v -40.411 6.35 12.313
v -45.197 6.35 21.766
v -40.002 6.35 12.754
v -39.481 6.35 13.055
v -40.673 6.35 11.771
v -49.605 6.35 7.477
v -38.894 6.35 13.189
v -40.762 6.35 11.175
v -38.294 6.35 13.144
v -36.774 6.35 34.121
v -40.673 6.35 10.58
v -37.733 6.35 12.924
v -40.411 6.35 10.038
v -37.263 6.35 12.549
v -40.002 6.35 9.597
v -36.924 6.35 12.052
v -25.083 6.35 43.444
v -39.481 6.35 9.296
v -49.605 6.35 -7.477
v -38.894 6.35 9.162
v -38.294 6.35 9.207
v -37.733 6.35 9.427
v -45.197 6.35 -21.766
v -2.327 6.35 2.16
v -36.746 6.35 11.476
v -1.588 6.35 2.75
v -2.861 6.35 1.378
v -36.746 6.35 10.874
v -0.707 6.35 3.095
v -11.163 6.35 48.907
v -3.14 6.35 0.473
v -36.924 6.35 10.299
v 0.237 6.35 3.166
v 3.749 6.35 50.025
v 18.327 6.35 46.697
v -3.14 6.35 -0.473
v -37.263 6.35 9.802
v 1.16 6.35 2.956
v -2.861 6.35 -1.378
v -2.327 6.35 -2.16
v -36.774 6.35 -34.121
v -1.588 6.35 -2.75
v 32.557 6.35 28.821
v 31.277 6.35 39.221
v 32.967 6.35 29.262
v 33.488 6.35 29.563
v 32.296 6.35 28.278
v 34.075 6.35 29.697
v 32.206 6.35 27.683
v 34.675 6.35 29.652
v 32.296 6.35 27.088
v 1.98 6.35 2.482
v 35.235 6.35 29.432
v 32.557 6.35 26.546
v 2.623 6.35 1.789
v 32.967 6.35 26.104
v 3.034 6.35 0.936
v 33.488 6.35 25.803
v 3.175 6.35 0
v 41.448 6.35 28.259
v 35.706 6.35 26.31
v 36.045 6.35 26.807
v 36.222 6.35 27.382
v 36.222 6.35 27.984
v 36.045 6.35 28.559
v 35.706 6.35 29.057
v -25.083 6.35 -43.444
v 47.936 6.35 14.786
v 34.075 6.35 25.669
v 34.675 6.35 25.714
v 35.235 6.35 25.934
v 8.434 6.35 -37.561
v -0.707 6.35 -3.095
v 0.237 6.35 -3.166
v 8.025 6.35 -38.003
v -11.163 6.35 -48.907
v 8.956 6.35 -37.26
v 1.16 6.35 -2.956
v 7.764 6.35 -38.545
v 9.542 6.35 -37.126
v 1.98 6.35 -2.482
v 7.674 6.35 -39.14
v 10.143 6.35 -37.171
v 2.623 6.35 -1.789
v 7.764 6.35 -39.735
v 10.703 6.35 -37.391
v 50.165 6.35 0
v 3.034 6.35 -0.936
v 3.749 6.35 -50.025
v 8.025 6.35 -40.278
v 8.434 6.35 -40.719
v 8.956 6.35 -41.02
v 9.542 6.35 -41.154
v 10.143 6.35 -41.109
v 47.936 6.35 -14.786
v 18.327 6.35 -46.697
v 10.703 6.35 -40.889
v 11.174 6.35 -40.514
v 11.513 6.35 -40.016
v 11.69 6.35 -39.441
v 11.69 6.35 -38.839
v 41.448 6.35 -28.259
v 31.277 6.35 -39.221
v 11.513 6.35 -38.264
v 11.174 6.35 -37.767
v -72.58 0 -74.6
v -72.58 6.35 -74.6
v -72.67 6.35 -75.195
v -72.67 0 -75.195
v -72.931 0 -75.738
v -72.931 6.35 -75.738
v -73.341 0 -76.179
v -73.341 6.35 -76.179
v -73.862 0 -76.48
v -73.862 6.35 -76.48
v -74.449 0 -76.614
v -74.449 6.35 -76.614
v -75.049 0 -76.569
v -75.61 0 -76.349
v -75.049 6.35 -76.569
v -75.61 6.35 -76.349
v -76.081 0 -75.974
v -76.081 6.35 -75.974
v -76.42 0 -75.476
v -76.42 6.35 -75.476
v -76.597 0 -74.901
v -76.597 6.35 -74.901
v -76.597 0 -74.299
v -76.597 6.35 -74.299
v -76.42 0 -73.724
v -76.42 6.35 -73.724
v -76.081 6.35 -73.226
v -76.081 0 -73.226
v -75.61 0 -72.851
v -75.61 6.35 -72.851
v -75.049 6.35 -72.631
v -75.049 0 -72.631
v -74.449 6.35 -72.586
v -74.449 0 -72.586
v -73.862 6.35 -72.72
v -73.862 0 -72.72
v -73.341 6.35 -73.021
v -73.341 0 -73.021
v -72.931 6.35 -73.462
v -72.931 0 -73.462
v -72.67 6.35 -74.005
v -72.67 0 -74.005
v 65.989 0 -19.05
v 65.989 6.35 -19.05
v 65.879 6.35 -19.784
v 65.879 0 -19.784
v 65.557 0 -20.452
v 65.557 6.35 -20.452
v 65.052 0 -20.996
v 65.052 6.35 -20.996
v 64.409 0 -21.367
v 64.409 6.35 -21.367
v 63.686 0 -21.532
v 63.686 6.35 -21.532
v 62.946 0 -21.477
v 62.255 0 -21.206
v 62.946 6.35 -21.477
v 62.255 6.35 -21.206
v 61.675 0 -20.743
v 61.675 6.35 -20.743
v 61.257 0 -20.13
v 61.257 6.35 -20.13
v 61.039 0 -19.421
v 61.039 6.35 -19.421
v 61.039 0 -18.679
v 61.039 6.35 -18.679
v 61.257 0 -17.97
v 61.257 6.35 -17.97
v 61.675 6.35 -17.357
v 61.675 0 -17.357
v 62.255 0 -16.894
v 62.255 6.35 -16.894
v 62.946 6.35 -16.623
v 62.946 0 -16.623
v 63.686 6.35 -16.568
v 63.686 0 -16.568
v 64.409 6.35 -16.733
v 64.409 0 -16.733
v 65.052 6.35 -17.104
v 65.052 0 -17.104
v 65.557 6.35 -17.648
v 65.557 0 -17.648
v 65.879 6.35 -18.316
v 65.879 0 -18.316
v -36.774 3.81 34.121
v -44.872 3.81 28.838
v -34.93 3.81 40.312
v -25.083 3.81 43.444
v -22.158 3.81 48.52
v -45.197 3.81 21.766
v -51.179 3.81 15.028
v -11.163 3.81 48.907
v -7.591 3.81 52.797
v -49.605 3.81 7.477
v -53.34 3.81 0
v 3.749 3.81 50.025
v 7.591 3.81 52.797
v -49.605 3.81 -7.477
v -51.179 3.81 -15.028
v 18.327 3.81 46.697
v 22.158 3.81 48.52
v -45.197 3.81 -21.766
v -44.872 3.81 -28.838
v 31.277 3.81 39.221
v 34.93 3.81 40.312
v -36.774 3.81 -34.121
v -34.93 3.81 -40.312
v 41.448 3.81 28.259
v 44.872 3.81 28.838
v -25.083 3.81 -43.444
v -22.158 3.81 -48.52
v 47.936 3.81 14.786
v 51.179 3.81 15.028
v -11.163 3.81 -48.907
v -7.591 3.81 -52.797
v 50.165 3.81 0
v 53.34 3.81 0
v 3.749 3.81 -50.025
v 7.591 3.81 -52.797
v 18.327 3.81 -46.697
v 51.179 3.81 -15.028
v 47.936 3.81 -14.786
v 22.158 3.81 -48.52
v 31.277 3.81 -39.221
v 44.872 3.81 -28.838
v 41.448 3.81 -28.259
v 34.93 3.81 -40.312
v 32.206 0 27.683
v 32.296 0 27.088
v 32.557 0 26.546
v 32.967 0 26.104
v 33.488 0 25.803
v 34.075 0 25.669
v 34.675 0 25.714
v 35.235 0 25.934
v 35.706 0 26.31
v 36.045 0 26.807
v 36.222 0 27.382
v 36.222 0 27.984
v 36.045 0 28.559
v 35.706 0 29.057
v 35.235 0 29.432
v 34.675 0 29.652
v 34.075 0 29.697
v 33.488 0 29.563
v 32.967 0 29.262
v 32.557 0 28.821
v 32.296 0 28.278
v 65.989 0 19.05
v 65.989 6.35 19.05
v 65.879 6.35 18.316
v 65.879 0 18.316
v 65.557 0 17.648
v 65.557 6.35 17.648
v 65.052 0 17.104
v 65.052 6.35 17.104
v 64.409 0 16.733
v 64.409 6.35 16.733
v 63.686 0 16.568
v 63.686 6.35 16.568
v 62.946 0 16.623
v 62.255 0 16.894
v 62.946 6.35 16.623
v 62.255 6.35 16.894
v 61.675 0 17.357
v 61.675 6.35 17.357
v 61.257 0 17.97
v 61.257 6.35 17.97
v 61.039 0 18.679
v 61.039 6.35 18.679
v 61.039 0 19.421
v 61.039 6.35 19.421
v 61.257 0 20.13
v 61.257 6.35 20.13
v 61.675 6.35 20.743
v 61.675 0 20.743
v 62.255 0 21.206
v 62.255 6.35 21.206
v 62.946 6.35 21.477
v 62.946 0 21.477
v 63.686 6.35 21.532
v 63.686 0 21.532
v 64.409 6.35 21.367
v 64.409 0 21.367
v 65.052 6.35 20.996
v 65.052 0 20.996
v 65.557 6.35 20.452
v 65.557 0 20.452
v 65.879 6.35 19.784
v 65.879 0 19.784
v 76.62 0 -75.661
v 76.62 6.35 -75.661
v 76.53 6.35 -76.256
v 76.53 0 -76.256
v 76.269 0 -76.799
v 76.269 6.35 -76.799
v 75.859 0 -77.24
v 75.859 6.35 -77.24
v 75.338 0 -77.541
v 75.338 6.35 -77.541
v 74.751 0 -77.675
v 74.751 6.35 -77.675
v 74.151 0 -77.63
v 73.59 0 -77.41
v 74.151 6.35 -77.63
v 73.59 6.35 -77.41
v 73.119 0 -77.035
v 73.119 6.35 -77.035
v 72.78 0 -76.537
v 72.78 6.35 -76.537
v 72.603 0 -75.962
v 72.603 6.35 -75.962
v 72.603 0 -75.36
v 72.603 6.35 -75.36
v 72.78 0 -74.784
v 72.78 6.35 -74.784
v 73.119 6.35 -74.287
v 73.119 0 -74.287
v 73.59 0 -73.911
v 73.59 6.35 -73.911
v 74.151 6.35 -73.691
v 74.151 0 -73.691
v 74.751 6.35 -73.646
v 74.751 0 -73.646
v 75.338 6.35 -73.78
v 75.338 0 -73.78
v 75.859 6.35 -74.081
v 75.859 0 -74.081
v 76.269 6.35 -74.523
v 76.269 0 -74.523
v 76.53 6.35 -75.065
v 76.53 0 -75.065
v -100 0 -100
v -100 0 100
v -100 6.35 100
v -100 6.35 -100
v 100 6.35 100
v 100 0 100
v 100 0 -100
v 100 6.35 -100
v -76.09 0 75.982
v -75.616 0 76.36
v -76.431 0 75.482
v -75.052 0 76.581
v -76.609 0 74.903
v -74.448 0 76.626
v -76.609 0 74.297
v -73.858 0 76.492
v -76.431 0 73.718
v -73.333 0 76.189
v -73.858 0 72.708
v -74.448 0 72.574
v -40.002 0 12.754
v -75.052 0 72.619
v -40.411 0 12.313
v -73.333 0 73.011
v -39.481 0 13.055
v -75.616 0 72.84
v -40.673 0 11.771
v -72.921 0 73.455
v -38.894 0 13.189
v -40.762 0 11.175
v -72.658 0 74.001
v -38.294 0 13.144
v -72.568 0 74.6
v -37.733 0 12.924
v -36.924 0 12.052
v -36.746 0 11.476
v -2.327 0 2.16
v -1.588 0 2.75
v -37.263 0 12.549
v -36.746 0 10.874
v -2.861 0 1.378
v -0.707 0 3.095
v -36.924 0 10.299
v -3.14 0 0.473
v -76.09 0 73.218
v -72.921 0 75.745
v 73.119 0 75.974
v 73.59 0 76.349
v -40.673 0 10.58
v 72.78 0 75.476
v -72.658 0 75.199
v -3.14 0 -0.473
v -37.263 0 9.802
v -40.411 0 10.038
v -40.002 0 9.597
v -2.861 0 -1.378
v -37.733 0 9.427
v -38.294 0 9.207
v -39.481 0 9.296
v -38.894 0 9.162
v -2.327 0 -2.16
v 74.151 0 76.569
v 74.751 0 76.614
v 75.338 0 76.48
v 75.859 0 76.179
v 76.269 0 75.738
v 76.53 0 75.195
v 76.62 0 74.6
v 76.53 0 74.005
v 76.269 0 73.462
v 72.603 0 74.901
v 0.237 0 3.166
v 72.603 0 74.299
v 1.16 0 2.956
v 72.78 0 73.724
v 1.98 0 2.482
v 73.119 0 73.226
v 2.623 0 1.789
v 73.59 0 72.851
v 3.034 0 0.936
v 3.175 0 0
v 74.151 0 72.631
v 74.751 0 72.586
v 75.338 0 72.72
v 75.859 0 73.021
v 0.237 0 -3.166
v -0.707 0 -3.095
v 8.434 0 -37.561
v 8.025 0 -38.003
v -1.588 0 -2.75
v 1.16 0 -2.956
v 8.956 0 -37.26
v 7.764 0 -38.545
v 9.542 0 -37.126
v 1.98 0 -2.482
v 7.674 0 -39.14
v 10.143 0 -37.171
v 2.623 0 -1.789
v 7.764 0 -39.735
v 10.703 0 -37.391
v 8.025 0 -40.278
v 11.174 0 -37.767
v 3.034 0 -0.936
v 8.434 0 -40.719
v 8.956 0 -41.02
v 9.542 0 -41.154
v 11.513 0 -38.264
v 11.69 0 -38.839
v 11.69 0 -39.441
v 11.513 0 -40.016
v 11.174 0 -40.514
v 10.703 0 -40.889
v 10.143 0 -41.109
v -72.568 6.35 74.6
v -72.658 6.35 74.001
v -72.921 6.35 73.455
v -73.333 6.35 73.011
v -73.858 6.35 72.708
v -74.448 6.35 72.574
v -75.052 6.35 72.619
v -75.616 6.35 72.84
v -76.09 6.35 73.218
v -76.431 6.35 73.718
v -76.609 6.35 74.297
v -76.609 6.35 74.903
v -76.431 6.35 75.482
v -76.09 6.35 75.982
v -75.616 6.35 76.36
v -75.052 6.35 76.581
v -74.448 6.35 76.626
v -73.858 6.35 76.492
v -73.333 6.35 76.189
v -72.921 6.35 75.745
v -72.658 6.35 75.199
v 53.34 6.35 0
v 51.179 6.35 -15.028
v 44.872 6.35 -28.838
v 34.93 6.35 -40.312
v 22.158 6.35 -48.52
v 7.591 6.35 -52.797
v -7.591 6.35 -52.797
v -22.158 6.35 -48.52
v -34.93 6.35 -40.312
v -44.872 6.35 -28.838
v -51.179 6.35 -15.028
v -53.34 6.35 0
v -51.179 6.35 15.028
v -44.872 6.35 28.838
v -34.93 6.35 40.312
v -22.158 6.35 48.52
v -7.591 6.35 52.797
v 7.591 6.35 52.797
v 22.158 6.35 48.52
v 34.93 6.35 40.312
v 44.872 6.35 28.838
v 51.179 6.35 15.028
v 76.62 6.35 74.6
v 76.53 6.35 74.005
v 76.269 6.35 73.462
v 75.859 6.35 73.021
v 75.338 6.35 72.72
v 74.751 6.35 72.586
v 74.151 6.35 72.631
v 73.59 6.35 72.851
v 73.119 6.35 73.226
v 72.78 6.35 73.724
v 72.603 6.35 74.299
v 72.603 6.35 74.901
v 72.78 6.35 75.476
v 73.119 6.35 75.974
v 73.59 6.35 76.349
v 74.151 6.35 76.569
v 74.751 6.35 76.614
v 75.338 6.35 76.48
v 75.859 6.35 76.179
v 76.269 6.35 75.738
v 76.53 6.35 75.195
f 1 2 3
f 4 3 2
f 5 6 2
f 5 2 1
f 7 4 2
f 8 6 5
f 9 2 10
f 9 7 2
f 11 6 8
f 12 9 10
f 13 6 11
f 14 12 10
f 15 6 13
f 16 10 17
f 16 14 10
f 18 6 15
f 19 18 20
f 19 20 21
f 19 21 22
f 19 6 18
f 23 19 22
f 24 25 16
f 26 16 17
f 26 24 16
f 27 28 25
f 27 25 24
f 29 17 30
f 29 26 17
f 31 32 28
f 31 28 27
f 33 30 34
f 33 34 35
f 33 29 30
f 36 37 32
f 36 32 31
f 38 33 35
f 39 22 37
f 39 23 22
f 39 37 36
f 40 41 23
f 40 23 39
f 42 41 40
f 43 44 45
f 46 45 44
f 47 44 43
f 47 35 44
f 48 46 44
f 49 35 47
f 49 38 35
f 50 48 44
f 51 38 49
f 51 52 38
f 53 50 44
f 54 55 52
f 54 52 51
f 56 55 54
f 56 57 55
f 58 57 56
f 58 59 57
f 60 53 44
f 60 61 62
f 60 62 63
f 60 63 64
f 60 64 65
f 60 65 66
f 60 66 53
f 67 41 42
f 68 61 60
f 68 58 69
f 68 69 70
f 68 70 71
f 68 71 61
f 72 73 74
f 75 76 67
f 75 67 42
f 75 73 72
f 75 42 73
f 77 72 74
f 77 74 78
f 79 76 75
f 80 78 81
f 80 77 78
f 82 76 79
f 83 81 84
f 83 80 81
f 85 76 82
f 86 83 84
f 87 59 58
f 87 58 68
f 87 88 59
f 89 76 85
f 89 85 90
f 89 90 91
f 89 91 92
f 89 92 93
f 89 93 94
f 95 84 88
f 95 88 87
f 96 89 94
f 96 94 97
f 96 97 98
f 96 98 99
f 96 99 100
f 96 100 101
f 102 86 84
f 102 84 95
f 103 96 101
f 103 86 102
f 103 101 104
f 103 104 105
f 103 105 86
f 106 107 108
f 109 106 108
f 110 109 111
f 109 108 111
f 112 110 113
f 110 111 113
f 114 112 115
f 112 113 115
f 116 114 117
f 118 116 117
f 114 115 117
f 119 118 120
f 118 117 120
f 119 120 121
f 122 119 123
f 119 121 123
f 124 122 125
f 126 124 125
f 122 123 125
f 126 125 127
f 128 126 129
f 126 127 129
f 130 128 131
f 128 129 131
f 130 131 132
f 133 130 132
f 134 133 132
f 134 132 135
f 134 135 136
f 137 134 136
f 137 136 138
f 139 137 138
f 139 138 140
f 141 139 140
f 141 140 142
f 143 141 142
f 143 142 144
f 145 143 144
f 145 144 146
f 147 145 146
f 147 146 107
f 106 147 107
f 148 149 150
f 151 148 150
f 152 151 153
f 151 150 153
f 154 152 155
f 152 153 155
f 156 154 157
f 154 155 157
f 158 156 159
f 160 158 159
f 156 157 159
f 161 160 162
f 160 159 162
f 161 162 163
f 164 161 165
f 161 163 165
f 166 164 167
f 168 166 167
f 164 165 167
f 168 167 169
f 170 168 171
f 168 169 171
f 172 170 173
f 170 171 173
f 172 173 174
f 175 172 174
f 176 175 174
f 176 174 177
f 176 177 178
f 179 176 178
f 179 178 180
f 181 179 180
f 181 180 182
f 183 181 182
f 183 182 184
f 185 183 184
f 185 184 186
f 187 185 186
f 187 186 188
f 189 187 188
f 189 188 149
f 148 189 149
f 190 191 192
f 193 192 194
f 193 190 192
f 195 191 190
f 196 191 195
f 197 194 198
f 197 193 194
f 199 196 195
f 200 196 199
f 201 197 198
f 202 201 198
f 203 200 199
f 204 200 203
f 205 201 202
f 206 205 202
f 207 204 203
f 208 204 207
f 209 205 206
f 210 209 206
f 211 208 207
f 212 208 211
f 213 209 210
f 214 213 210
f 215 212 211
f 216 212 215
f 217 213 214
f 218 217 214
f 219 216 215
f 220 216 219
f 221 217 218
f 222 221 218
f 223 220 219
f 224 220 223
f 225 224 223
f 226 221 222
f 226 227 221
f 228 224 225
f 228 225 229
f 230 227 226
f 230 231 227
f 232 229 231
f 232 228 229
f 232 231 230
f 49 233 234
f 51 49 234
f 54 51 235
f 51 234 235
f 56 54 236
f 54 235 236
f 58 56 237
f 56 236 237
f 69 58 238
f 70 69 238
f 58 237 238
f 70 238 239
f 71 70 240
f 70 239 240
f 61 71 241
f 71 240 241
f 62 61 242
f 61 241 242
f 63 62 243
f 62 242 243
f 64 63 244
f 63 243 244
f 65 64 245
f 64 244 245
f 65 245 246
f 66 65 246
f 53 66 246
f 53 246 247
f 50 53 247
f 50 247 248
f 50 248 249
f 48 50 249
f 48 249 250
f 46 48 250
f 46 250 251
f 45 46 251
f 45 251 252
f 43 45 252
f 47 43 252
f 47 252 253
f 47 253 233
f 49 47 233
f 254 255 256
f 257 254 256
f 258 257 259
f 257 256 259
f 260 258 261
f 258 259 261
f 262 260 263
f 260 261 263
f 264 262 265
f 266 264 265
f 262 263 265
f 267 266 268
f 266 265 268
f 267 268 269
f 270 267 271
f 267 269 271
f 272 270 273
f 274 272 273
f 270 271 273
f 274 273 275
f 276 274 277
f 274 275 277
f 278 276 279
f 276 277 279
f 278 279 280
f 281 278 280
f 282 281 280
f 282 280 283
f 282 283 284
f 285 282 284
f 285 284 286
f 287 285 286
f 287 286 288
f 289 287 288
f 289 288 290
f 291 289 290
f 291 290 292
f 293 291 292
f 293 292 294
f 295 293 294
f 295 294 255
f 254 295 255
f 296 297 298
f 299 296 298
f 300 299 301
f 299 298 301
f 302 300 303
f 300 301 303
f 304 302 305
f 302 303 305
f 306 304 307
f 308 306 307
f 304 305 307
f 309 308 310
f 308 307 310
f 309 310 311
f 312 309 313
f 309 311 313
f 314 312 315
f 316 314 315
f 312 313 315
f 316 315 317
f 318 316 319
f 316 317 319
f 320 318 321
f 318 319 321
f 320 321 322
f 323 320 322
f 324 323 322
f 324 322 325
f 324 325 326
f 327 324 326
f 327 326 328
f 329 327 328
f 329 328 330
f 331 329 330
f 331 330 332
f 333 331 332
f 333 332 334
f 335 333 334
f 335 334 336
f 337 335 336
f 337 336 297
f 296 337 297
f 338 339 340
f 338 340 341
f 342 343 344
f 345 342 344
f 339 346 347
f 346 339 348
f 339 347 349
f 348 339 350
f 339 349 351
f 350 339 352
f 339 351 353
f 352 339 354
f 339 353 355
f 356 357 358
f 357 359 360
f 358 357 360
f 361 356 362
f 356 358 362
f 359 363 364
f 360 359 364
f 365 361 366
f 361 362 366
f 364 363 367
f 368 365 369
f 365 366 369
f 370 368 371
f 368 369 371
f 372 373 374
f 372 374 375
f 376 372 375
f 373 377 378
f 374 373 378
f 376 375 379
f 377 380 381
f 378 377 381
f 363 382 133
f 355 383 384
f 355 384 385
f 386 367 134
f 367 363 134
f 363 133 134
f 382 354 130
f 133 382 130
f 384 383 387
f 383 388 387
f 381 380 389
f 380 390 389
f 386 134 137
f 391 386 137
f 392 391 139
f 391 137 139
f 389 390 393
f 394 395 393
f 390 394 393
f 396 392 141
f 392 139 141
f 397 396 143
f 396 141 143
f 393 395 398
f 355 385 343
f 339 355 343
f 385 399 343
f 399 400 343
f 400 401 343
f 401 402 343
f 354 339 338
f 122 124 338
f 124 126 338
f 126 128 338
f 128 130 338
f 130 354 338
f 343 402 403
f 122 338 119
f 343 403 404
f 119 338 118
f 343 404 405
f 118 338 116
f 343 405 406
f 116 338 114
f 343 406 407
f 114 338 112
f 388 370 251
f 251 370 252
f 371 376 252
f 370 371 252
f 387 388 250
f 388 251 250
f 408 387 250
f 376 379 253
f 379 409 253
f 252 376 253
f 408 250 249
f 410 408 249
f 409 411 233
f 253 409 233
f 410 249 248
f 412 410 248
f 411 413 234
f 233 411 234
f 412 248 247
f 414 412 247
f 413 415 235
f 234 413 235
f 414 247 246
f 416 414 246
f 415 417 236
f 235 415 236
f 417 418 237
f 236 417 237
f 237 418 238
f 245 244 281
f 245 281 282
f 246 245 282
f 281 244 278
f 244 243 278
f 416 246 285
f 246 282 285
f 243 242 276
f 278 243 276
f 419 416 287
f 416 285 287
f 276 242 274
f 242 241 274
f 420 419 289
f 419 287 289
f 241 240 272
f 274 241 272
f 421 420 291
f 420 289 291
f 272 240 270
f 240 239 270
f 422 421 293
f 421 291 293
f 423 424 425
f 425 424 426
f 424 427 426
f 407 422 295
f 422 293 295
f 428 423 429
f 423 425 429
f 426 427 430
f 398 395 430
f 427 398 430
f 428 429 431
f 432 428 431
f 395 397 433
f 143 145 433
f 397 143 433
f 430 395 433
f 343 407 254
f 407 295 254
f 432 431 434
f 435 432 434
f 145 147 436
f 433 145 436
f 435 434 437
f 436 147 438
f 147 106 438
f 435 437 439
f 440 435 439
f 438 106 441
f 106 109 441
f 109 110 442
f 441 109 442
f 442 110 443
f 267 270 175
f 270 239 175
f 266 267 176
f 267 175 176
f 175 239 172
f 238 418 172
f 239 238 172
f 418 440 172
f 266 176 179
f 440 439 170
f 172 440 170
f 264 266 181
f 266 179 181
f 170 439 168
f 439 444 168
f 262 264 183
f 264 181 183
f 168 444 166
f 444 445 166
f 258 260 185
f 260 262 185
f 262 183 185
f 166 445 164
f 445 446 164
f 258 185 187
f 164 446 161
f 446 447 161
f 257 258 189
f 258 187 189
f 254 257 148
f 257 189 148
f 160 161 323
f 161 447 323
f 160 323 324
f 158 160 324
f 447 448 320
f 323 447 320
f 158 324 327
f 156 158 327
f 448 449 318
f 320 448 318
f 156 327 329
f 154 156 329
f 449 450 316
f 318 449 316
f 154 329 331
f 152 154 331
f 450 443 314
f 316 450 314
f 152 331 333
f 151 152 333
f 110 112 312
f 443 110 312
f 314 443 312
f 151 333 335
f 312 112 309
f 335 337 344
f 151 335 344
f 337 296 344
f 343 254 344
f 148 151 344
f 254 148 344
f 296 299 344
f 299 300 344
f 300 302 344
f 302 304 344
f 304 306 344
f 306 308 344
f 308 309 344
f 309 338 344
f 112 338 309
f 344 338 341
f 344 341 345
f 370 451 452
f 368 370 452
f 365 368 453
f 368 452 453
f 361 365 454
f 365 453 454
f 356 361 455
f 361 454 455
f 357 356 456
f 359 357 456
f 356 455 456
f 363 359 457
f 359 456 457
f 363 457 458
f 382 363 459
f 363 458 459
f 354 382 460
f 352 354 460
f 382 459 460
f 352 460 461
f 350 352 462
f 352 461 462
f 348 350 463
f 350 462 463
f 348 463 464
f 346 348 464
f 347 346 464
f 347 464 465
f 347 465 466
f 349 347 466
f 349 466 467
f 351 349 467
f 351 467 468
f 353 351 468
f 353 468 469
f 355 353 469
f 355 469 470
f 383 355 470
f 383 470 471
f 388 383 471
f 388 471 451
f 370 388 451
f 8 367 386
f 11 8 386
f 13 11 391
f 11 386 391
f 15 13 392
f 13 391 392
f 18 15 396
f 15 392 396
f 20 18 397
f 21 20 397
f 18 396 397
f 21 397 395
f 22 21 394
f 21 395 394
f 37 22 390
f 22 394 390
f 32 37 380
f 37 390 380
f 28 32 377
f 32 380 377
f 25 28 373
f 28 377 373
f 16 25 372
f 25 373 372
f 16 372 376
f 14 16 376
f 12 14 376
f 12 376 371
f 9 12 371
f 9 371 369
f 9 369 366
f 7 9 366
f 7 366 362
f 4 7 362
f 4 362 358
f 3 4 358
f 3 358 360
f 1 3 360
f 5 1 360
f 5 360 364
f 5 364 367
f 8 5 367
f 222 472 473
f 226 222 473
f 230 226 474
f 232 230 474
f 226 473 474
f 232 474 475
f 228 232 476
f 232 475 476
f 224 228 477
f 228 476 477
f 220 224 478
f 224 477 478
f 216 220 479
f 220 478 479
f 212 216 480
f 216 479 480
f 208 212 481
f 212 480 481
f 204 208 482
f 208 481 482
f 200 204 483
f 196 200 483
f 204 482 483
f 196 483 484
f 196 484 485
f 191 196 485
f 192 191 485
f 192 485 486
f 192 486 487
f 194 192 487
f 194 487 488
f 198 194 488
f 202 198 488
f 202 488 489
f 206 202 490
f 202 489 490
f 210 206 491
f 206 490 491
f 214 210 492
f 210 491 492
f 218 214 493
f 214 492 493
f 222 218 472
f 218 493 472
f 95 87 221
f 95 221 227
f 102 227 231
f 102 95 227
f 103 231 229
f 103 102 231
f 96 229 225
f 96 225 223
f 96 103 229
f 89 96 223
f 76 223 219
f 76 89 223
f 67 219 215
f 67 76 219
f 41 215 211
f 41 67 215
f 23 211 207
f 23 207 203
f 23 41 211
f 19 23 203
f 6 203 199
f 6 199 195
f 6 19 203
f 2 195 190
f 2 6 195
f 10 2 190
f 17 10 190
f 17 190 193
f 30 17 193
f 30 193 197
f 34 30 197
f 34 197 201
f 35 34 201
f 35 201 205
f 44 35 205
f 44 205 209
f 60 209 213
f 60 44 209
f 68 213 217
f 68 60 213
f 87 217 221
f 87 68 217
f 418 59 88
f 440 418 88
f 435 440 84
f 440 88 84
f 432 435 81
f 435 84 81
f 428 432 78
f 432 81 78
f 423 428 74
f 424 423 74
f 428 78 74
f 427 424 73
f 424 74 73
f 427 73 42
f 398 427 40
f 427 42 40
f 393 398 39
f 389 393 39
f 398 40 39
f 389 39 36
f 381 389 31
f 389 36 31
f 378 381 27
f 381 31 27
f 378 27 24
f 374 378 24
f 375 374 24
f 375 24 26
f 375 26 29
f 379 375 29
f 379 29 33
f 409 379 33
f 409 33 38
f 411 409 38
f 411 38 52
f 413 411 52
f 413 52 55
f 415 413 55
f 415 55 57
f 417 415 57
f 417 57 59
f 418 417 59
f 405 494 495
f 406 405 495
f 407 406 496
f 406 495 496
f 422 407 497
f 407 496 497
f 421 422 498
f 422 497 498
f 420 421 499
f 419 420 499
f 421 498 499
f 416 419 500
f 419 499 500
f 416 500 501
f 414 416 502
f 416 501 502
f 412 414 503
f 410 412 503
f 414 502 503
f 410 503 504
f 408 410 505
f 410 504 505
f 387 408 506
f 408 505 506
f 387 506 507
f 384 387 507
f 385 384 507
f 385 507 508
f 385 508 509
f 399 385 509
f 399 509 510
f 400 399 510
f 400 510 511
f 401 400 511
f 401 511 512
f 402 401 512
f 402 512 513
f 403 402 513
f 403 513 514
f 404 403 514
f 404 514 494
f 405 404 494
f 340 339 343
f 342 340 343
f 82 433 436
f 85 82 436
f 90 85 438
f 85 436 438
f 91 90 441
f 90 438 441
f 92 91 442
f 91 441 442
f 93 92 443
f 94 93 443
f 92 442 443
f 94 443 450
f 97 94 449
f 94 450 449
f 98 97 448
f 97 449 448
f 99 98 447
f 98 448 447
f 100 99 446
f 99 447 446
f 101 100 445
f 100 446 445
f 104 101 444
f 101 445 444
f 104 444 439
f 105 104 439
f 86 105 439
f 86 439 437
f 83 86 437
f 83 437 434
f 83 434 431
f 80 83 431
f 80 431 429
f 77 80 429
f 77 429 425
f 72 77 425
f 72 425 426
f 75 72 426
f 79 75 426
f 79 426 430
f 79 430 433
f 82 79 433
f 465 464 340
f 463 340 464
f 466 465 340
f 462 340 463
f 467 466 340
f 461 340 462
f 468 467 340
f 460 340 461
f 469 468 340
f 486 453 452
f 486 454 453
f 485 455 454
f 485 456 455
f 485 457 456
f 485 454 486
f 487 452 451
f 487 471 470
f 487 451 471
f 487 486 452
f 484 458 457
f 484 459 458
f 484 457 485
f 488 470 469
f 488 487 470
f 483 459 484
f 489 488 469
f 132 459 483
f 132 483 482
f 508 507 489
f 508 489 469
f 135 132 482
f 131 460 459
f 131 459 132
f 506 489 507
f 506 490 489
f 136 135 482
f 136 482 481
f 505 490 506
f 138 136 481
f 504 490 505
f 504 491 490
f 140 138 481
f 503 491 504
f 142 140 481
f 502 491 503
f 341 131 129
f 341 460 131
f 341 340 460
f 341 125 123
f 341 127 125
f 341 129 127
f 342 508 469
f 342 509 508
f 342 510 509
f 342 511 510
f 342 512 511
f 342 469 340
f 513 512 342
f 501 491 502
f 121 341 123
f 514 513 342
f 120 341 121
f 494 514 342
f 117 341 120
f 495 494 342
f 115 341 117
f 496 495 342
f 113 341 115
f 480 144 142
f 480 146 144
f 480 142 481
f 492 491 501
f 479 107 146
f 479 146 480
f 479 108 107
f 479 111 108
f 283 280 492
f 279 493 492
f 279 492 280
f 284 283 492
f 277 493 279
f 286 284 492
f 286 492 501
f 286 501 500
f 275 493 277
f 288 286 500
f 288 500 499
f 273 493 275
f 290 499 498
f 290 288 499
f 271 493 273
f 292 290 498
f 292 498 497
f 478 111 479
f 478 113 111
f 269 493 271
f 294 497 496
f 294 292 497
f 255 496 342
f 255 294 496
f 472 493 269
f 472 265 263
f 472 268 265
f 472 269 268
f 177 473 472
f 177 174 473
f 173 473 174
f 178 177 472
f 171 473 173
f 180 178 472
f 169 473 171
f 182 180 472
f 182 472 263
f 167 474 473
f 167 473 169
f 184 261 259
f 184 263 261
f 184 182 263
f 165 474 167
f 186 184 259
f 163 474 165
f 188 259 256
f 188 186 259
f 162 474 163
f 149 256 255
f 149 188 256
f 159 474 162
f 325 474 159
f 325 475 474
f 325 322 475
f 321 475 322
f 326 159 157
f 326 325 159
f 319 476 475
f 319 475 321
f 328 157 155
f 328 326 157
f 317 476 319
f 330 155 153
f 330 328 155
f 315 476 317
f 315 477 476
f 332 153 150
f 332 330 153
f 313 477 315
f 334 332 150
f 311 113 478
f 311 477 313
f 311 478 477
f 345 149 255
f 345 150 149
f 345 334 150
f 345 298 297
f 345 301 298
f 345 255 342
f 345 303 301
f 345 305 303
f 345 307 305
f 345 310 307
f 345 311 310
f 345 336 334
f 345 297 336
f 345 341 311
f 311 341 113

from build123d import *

# Parameters (mm, degrees)
SKETCH1_W                  = 200
SKETCH1_H                  = 200
BOSS_EXTRUDE1_DEPTH        = 6.35
SKETCH2_R                  = 3.175
CUT_EXTRUDE1_DEPTH         = 7.35
SKETCH3_R                  = 2.4892
CUT_EXTRUDE2_DEPTH         = 7.35
SKETCH4_R                  = 53.34
SKETCH4_R_2                = 50.165
CUT_EXTRUDE3_DEPTH         = 2.54
F_10_32_TAPPED_HOLE1_D     = 4.0386
F_10_32_TAPPED_HOLE1_DEPTH = 13.716
F_10_32_TAPPED_HOLE1_TIP   = 1.213317848
SKETCH9_R                  = 2.02
SKETCH9_R_2                = 2.032
CUT_EXTRUDE4_DEPTH         = 7.35


with BuildPart() as part:
    # Sketch1 → Boss-Extrude1 (new body)
    with BuildSketch(Plane(origin=(0, 0, 0), x_dir=(1, 0, 0), z_dir=(0, 1, 0))):
        Rectangle(SKETCH1_W, SKETCH1_H)
    extrude(amount=BOSS_EXTRUDE1_DEPTH)

    # Sketch2 → Cut-Extrude1 (cut, through all)
    with BuildSketch(Plane(origin=(0, 6.35, 0), x_dir=(1, 0, 0), z_dir=(0, 1, 0))):
        Circle(SKETCH2_R)
    extrude(amount=-CUT_EXTRUDE1_DEPTH, mode=Mode.SUBTRACT)

    # Sketch3 → Cut-Extrude2 (cut, through all)
    with BuildSketch(Plane(origin=(0, 6.35, 0), x_dir=(1, 0, 0), z_dir=(0, 1, 0))):
        with Locations((63.5, -19.05)):
            Circle(SKETCH3_R)
        with Locations((63.5, 19.05)):
            Circle(SKETCH3_R)
    extrude(amount=-CUT_EXTRUDE2_DEPTH, mode=Mode.SUBTRACT)

    # Sketch4 → Cut-Extrude3 (cut)
    with BuildSketch(Plane(origin=(0, 6.35, 0), x_dir=(1, 0, 0), z_dir=(0, 1, 0))):
        Circle(SKETCH4_R)
        Circle(SKETCH4_R_2, mode=Mode.SUBTRACT)
    extrude(amount=-CUT_EXTRUDE3_DEPTH, mode=Mode.SUBTRACT)

    # #10-32 Tapped Hole1
    with Locations(Plane(origin=(0, 6.35, 0), x_dir=(1, 0, 0), z_dir=(0, 1, 0))):
        with Locations((9.693302756, 39.140054777), (-38.74293312, -11.175380955), (34.225642894, -27.683137416)):
            Hole(F_10_32_TAPPED_HOLE1_D / 2, depth=F_10_32_TAPPED_HOLE1_DEPTH)
            with Locations((0, 0, -(F_10_32_TAPPED_HOLE1_DEPTH + F_10_32_TAPPED_HOLE1_TIP / 2))):  # 118° drill point
                Cone(0, F_10_32_TAPPED_HOLE1_D / 2, F_10_32_TAPPED_HOLE1_TIP, mode=Mode.SUBTRACT)

    # Sketch9 → Cut-Extrude4 (cut, through all)
    with BuildSketch(Plane(origin=(0, 6.35, 0), x_dir=(1, 0, 0), z_dir=(0, 1, 0))):
        with Locations((-74.6, 74.6)):
            Circle(SKETCH9_R)
        with Locations((74.6, 75.660597777)):
            Circle(SKETCH9_R)
        with Locations((74.6, -74.6)):
            Circle(SKETCH9_R)
        with Locations((-74.6, -74.6)):
            Circle(SKETCH9_R_2)
    extrude(amount=-CUT_EXTRUDE4_DEPTH, mode=Mode.SUBTRACT)


solid = part.part
